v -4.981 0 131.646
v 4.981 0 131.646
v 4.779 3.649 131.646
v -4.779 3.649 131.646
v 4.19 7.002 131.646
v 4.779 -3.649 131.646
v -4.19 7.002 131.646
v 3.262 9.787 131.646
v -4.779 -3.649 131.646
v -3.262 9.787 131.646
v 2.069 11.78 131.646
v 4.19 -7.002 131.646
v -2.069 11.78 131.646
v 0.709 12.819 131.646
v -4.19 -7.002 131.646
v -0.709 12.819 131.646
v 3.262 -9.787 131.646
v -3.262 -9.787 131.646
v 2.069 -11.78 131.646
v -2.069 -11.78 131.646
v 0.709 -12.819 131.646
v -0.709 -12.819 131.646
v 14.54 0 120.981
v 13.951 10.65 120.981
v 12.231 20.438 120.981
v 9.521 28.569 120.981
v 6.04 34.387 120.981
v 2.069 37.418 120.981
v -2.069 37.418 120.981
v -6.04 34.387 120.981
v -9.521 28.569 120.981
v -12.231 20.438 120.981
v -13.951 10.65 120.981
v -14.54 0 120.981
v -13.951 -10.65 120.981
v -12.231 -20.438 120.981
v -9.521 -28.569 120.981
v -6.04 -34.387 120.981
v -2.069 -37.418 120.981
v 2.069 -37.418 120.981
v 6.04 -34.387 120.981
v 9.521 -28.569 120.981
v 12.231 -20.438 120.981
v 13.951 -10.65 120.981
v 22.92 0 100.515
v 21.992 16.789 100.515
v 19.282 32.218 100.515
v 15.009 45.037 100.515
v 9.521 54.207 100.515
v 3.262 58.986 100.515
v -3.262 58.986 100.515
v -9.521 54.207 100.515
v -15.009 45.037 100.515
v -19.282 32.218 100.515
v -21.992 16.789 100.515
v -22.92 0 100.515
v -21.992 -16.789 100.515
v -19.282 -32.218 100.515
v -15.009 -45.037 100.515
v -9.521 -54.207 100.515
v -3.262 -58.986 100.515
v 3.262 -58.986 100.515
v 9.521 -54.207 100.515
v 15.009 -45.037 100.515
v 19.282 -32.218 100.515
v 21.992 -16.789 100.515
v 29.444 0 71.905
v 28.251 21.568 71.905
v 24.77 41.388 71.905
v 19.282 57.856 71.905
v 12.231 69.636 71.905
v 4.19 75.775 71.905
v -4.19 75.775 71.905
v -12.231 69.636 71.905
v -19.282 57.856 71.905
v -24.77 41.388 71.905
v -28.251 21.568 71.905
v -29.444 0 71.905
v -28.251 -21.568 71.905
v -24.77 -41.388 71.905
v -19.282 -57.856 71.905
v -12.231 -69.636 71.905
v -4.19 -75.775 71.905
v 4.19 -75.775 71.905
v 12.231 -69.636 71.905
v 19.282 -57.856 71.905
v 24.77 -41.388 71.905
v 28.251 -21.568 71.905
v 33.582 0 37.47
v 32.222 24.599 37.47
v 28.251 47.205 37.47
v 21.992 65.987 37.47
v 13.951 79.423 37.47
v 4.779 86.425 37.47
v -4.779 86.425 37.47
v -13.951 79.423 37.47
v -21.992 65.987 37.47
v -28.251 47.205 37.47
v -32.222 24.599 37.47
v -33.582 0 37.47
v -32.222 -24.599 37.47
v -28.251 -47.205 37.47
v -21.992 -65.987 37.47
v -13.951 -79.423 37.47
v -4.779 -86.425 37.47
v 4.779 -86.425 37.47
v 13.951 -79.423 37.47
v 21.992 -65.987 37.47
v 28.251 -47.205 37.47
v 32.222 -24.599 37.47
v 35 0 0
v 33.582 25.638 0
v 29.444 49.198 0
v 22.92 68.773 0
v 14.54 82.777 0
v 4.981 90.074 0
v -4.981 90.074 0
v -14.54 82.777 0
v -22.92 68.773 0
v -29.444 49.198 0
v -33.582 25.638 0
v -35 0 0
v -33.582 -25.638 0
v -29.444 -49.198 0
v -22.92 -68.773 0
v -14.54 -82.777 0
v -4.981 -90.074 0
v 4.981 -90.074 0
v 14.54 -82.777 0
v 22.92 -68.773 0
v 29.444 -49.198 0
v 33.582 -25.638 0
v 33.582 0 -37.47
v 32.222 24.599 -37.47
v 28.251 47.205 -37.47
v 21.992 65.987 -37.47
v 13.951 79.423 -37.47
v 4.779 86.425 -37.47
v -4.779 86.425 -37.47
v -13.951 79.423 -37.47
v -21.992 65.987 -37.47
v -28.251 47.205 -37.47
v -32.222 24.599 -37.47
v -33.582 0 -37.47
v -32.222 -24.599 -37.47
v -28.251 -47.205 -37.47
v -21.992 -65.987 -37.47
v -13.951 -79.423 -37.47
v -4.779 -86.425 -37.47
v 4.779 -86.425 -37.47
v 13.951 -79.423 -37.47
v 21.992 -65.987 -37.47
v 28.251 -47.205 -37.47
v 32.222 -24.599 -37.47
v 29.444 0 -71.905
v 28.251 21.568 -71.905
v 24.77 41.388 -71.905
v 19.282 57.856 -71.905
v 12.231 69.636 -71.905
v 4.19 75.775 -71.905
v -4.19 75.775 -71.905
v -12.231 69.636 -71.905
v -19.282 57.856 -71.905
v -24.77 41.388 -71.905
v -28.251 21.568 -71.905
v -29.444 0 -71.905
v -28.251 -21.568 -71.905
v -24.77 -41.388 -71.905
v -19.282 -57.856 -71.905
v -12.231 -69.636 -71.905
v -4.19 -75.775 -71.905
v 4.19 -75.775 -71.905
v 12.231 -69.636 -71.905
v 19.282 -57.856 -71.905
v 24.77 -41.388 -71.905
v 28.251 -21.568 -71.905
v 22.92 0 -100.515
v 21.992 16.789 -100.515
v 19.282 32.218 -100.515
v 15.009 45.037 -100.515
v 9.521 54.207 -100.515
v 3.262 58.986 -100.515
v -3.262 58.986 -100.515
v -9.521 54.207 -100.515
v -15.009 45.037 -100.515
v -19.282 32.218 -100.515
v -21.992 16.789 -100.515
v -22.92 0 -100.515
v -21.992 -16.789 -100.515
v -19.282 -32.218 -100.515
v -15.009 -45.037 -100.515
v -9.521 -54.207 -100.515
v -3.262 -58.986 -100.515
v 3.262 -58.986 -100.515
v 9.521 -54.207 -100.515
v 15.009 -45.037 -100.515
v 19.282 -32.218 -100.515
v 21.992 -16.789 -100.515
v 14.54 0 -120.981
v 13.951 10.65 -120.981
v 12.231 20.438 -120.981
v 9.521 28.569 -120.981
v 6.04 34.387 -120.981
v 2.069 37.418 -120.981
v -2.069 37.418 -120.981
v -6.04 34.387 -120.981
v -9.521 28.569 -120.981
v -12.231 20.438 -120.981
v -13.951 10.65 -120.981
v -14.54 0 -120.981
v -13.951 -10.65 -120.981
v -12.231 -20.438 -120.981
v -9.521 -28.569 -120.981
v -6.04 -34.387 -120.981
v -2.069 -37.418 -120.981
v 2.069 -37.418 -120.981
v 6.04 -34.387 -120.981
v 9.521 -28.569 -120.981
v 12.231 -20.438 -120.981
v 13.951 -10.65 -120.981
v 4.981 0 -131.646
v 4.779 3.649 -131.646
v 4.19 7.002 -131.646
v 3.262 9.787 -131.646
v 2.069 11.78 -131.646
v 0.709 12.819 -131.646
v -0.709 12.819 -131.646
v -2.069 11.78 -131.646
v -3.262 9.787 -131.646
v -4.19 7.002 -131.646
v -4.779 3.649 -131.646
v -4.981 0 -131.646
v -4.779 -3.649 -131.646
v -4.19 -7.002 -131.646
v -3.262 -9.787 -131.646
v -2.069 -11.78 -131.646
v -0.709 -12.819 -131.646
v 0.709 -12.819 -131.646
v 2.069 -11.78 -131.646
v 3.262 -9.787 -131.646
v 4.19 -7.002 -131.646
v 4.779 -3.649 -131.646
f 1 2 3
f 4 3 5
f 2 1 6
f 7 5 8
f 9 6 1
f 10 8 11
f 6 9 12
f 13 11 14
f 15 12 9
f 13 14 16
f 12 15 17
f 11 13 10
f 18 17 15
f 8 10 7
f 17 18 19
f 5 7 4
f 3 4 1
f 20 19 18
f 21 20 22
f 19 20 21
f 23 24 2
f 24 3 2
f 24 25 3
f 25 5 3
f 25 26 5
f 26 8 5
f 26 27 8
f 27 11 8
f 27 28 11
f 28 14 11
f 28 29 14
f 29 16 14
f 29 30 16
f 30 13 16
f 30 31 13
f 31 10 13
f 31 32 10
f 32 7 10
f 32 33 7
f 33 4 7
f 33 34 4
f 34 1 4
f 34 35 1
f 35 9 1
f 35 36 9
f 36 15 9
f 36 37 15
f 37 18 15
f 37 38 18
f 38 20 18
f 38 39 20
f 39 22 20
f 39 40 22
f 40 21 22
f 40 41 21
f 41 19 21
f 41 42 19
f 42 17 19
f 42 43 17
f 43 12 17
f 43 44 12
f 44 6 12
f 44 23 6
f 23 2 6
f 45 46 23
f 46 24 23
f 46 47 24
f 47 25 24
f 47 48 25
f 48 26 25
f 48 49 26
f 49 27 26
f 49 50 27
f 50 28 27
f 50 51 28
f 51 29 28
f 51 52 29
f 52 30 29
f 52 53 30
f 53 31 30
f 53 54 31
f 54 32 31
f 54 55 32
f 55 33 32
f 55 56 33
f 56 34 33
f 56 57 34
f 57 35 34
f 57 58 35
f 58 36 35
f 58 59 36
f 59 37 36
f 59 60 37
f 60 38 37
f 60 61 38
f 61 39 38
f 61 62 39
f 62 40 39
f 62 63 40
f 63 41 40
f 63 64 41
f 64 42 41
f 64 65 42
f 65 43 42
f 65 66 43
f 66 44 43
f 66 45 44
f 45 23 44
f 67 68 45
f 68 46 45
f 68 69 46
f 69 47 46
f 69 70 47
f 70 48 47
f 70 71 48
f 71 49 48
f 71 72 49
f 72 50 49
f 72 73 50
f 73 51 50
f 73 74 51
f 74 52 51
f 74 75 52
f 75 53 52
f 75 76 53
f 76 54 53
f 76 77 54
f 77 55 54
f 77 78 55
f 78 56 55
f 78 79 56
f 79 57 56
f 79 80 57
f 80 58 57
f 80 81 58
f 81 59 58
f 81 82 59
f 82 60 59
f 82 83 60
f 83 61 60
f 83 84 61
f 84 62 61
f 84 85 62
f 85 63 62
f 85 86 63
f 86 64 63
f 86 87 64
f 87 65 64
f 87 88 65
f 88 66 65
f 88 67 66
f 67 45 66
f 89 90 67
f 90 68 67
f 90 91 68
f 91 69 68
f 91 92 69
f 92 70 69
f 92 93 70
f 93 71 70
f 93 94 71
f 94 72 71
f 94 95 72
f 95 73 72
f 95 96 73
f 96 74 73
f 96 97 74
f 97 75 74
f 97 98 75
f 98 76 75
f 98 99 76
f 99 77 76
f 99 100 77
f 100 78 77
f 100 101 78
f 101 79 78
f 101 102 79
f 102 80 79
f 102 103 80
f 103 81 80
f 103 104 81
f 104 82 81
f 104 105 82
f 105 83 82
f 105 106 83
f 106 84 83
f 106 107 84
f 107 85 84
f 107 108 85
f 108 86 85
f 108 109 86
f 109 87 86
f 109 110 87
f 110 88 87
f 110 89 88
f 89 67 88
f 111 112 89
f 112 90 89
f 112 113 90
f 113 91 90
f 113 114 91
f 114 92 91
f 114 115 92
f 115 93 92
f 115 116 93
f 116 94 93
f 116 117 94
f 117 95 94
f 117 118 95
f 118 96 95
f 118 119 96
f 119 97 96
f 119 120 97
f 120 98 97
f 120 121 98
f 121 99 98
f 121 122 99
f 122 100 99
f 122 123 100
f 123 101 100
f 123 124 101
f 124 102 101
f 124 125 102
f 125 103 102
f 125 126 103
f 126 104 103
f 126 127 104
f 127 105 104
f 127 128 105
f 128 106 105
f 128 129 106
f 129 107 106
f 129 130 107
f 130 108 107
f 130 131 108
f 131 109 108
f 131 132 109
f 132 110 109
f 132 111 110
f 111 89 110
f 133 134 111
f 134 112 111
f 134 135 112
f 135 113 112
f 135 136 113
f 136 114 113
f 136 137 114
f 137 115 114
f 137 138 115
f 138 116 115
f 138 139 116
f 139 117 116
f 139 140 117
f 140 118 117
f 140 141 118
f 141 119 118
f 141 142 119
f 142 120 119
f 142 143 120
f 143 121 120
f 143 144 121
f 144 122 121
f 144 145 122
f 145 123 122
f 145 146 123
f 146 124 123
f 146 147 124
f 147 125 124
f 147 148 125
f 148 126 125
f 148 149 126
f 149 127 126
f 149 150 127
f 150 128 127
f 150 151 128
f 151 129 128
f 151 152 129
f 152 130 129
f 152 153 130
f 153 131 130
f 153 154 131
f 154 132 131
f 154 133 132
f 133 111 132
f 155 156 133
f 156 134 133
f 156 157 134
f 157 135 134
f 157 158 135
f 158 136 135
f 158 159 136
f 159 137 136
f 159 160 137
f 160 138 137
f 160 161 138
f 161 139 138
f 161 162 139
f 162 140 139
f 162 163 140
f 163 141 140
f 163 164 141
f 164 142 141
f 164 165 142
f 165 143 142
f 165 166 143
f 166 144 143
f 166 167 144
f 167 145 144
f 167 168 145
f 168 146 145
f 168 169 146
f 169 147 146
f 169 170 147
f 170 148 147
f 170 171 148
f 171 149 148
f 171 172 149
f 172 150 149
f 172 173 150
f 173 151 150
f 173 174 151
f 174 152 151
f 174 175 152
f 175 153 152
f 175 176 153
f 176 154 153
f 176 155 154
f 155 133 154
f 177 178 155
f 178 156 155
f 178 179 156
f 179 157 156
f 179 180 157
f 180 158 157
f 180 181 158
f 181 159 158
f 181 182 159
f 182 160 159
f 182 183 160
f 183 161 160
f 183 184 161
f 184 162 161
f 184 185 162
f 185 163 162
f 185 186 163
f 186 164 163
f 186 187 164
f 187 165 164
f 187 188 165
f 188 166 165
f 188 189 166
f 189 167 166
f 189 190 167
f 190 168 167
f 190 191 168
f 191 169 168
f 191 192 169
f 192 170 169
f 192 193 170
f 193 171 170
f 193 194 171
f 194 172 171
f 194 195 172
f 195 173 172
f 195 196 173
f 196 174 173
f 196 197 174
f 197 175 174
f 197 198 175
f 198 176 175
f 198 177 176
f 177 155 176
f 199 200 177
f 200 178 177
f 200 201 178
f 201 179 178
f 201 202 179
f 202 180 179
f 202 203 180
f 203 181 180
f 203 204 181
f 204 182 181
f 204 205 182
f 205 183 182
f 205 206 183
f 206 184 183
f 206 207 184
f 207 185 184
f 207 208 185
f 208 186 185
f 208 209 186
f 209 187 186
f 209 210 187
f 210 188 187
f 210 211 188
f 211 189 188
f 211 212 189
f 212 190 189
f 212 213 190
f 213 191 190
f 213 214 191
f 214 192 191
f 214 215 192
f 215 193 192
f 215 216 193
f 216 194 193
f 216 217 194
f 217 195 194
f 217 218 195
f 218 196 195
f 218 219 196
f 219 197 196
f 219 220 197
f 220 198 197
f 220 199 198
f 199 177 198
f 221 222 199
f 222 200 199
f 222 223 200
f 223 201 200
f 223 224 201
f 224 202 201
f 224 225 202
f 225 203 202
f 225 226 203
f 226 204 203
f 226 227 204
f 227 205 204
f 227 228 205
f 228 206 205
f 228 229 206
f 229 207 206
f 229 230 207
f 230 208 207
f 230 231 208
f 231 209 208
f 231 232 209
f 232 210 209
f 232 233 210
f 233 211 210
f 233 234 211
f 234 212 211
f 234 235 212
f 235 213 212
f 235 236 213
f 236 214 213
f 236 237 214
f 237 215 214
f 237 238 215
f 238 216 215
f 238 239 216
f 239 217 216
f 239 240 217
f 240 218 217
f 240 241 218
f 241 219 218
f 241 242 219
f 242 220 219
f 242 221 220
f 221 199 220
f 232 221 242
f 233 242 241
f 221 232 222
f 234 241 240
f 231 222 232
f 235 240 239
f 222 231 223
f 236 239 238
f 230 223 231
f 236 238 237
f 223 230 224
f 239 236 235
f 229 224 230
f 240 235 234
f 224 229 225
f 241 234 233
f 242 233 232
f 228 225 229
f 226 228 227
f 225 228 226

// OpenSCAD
// Generated by SolidPython 1.0.1 on 2020-07-29 00:46:46


scale(v = [5, 13, 19]) {
	sphere(r = 7);
}
/***********************************************
*********      SolidPython code:      **********
************************************************
 
# import packages: SolidPython
from solid import *
from solid.utils import *
from itertools import chain, combinations, permutations


class Resize:

    def __init__(self, scad_file):
        self.scad_file = scad_file
        #self.scad_file = import_scad(scad_file)
        # cone/cylinder param:
        self.r1 = 0
        self.r2 = 0
        self.h = 0
        # rectangular prism param:
        self.w = 0
        self.l = 0
        # ellipse param:
        self.r = 0

    # import OpenScad code (file name corresponds to shape)


    # classify shape + parameters
    def assign(self, param1, param2, param3):
        if self.scad_file == 'cone.scad':
            self.r1 = param1
            self.r2 = param2
            self.h = param3
        elif self.scad_file == 'cylinder.scad':
            self.r1 = param1
            self.r2 = param2
            self.h = param3
        elif self.scad_file == 'rectangularPrism.scad':
            self.h = param1
            self.l = param2
            self.w = param3
        else:
            self.r = param1
            self.h = param2

    # resize parameters
    def iterate(self):
        x = range(3, 20, 2)
        i = 1
        if self.scad_file == 'cone.scad':
            tempList = list(permutations(x, 2))
            for temp in tempList:
                param1 = temp[0]
                param2 = temp[1]
                filepath = 'produced_scad_files/' + 'cone' + str(param1) + '_' + str(param2) + '_' + '.scad'
                scad_render_to_file(cylinder(h=param1, r1=param2, r2=0), filepath)

        elif self.scad_file == 'cylinder.scad':
            tempList = list(permutations(x, 3))
            for temp in tempList:
                param1 = temp[0]
                param2 = temp[1]
                filepath = 'produced_scad_files/' + 'cylinder' + str(param1) + '_' + str(param2) + '_' + '.scad'
                scad_render_to_file(cylinder(h=param1, r1=param2, r2=param2), filepath)

        elif self.scad_file == 'rectangularPrism.scad':
            tempList = list(permutations(x, 3))
            for temp in tempList:
                param1 = temp[0]
                param2 = temp[1]
                param3 = temp[2]
                filepath = 'produced_scad_files/' + 'rectangularPrism' + str(param1) + '_' + str(param2) + '_' + str(
                    param3) + '.scad'
                scad_render_to_file(cube(size=(param1, param2, param3)), filepath)

        elif self.scad_file == 'ellipse.scad':
            tempList = list(permutations(x, 4))
            for temp in tempList:
                param1 = temp[0]
                param2 = temp[1]
                param3 = temp[2]
                param4 = temp[3]
                filepath = 'produced_scad_files/' + 'ellipse' + str(param1) + '_' + str(param2) + '_' + str(param3) + '_' + str(param4) + '.scad'
                scad_render_to_file(scale([param1, param2, param3])(sphere(r=param4)), filepath)

    def render_to_scadfile(self):
        scad_render_to_file(scad, 'example.scad') 
 
************************************************/
